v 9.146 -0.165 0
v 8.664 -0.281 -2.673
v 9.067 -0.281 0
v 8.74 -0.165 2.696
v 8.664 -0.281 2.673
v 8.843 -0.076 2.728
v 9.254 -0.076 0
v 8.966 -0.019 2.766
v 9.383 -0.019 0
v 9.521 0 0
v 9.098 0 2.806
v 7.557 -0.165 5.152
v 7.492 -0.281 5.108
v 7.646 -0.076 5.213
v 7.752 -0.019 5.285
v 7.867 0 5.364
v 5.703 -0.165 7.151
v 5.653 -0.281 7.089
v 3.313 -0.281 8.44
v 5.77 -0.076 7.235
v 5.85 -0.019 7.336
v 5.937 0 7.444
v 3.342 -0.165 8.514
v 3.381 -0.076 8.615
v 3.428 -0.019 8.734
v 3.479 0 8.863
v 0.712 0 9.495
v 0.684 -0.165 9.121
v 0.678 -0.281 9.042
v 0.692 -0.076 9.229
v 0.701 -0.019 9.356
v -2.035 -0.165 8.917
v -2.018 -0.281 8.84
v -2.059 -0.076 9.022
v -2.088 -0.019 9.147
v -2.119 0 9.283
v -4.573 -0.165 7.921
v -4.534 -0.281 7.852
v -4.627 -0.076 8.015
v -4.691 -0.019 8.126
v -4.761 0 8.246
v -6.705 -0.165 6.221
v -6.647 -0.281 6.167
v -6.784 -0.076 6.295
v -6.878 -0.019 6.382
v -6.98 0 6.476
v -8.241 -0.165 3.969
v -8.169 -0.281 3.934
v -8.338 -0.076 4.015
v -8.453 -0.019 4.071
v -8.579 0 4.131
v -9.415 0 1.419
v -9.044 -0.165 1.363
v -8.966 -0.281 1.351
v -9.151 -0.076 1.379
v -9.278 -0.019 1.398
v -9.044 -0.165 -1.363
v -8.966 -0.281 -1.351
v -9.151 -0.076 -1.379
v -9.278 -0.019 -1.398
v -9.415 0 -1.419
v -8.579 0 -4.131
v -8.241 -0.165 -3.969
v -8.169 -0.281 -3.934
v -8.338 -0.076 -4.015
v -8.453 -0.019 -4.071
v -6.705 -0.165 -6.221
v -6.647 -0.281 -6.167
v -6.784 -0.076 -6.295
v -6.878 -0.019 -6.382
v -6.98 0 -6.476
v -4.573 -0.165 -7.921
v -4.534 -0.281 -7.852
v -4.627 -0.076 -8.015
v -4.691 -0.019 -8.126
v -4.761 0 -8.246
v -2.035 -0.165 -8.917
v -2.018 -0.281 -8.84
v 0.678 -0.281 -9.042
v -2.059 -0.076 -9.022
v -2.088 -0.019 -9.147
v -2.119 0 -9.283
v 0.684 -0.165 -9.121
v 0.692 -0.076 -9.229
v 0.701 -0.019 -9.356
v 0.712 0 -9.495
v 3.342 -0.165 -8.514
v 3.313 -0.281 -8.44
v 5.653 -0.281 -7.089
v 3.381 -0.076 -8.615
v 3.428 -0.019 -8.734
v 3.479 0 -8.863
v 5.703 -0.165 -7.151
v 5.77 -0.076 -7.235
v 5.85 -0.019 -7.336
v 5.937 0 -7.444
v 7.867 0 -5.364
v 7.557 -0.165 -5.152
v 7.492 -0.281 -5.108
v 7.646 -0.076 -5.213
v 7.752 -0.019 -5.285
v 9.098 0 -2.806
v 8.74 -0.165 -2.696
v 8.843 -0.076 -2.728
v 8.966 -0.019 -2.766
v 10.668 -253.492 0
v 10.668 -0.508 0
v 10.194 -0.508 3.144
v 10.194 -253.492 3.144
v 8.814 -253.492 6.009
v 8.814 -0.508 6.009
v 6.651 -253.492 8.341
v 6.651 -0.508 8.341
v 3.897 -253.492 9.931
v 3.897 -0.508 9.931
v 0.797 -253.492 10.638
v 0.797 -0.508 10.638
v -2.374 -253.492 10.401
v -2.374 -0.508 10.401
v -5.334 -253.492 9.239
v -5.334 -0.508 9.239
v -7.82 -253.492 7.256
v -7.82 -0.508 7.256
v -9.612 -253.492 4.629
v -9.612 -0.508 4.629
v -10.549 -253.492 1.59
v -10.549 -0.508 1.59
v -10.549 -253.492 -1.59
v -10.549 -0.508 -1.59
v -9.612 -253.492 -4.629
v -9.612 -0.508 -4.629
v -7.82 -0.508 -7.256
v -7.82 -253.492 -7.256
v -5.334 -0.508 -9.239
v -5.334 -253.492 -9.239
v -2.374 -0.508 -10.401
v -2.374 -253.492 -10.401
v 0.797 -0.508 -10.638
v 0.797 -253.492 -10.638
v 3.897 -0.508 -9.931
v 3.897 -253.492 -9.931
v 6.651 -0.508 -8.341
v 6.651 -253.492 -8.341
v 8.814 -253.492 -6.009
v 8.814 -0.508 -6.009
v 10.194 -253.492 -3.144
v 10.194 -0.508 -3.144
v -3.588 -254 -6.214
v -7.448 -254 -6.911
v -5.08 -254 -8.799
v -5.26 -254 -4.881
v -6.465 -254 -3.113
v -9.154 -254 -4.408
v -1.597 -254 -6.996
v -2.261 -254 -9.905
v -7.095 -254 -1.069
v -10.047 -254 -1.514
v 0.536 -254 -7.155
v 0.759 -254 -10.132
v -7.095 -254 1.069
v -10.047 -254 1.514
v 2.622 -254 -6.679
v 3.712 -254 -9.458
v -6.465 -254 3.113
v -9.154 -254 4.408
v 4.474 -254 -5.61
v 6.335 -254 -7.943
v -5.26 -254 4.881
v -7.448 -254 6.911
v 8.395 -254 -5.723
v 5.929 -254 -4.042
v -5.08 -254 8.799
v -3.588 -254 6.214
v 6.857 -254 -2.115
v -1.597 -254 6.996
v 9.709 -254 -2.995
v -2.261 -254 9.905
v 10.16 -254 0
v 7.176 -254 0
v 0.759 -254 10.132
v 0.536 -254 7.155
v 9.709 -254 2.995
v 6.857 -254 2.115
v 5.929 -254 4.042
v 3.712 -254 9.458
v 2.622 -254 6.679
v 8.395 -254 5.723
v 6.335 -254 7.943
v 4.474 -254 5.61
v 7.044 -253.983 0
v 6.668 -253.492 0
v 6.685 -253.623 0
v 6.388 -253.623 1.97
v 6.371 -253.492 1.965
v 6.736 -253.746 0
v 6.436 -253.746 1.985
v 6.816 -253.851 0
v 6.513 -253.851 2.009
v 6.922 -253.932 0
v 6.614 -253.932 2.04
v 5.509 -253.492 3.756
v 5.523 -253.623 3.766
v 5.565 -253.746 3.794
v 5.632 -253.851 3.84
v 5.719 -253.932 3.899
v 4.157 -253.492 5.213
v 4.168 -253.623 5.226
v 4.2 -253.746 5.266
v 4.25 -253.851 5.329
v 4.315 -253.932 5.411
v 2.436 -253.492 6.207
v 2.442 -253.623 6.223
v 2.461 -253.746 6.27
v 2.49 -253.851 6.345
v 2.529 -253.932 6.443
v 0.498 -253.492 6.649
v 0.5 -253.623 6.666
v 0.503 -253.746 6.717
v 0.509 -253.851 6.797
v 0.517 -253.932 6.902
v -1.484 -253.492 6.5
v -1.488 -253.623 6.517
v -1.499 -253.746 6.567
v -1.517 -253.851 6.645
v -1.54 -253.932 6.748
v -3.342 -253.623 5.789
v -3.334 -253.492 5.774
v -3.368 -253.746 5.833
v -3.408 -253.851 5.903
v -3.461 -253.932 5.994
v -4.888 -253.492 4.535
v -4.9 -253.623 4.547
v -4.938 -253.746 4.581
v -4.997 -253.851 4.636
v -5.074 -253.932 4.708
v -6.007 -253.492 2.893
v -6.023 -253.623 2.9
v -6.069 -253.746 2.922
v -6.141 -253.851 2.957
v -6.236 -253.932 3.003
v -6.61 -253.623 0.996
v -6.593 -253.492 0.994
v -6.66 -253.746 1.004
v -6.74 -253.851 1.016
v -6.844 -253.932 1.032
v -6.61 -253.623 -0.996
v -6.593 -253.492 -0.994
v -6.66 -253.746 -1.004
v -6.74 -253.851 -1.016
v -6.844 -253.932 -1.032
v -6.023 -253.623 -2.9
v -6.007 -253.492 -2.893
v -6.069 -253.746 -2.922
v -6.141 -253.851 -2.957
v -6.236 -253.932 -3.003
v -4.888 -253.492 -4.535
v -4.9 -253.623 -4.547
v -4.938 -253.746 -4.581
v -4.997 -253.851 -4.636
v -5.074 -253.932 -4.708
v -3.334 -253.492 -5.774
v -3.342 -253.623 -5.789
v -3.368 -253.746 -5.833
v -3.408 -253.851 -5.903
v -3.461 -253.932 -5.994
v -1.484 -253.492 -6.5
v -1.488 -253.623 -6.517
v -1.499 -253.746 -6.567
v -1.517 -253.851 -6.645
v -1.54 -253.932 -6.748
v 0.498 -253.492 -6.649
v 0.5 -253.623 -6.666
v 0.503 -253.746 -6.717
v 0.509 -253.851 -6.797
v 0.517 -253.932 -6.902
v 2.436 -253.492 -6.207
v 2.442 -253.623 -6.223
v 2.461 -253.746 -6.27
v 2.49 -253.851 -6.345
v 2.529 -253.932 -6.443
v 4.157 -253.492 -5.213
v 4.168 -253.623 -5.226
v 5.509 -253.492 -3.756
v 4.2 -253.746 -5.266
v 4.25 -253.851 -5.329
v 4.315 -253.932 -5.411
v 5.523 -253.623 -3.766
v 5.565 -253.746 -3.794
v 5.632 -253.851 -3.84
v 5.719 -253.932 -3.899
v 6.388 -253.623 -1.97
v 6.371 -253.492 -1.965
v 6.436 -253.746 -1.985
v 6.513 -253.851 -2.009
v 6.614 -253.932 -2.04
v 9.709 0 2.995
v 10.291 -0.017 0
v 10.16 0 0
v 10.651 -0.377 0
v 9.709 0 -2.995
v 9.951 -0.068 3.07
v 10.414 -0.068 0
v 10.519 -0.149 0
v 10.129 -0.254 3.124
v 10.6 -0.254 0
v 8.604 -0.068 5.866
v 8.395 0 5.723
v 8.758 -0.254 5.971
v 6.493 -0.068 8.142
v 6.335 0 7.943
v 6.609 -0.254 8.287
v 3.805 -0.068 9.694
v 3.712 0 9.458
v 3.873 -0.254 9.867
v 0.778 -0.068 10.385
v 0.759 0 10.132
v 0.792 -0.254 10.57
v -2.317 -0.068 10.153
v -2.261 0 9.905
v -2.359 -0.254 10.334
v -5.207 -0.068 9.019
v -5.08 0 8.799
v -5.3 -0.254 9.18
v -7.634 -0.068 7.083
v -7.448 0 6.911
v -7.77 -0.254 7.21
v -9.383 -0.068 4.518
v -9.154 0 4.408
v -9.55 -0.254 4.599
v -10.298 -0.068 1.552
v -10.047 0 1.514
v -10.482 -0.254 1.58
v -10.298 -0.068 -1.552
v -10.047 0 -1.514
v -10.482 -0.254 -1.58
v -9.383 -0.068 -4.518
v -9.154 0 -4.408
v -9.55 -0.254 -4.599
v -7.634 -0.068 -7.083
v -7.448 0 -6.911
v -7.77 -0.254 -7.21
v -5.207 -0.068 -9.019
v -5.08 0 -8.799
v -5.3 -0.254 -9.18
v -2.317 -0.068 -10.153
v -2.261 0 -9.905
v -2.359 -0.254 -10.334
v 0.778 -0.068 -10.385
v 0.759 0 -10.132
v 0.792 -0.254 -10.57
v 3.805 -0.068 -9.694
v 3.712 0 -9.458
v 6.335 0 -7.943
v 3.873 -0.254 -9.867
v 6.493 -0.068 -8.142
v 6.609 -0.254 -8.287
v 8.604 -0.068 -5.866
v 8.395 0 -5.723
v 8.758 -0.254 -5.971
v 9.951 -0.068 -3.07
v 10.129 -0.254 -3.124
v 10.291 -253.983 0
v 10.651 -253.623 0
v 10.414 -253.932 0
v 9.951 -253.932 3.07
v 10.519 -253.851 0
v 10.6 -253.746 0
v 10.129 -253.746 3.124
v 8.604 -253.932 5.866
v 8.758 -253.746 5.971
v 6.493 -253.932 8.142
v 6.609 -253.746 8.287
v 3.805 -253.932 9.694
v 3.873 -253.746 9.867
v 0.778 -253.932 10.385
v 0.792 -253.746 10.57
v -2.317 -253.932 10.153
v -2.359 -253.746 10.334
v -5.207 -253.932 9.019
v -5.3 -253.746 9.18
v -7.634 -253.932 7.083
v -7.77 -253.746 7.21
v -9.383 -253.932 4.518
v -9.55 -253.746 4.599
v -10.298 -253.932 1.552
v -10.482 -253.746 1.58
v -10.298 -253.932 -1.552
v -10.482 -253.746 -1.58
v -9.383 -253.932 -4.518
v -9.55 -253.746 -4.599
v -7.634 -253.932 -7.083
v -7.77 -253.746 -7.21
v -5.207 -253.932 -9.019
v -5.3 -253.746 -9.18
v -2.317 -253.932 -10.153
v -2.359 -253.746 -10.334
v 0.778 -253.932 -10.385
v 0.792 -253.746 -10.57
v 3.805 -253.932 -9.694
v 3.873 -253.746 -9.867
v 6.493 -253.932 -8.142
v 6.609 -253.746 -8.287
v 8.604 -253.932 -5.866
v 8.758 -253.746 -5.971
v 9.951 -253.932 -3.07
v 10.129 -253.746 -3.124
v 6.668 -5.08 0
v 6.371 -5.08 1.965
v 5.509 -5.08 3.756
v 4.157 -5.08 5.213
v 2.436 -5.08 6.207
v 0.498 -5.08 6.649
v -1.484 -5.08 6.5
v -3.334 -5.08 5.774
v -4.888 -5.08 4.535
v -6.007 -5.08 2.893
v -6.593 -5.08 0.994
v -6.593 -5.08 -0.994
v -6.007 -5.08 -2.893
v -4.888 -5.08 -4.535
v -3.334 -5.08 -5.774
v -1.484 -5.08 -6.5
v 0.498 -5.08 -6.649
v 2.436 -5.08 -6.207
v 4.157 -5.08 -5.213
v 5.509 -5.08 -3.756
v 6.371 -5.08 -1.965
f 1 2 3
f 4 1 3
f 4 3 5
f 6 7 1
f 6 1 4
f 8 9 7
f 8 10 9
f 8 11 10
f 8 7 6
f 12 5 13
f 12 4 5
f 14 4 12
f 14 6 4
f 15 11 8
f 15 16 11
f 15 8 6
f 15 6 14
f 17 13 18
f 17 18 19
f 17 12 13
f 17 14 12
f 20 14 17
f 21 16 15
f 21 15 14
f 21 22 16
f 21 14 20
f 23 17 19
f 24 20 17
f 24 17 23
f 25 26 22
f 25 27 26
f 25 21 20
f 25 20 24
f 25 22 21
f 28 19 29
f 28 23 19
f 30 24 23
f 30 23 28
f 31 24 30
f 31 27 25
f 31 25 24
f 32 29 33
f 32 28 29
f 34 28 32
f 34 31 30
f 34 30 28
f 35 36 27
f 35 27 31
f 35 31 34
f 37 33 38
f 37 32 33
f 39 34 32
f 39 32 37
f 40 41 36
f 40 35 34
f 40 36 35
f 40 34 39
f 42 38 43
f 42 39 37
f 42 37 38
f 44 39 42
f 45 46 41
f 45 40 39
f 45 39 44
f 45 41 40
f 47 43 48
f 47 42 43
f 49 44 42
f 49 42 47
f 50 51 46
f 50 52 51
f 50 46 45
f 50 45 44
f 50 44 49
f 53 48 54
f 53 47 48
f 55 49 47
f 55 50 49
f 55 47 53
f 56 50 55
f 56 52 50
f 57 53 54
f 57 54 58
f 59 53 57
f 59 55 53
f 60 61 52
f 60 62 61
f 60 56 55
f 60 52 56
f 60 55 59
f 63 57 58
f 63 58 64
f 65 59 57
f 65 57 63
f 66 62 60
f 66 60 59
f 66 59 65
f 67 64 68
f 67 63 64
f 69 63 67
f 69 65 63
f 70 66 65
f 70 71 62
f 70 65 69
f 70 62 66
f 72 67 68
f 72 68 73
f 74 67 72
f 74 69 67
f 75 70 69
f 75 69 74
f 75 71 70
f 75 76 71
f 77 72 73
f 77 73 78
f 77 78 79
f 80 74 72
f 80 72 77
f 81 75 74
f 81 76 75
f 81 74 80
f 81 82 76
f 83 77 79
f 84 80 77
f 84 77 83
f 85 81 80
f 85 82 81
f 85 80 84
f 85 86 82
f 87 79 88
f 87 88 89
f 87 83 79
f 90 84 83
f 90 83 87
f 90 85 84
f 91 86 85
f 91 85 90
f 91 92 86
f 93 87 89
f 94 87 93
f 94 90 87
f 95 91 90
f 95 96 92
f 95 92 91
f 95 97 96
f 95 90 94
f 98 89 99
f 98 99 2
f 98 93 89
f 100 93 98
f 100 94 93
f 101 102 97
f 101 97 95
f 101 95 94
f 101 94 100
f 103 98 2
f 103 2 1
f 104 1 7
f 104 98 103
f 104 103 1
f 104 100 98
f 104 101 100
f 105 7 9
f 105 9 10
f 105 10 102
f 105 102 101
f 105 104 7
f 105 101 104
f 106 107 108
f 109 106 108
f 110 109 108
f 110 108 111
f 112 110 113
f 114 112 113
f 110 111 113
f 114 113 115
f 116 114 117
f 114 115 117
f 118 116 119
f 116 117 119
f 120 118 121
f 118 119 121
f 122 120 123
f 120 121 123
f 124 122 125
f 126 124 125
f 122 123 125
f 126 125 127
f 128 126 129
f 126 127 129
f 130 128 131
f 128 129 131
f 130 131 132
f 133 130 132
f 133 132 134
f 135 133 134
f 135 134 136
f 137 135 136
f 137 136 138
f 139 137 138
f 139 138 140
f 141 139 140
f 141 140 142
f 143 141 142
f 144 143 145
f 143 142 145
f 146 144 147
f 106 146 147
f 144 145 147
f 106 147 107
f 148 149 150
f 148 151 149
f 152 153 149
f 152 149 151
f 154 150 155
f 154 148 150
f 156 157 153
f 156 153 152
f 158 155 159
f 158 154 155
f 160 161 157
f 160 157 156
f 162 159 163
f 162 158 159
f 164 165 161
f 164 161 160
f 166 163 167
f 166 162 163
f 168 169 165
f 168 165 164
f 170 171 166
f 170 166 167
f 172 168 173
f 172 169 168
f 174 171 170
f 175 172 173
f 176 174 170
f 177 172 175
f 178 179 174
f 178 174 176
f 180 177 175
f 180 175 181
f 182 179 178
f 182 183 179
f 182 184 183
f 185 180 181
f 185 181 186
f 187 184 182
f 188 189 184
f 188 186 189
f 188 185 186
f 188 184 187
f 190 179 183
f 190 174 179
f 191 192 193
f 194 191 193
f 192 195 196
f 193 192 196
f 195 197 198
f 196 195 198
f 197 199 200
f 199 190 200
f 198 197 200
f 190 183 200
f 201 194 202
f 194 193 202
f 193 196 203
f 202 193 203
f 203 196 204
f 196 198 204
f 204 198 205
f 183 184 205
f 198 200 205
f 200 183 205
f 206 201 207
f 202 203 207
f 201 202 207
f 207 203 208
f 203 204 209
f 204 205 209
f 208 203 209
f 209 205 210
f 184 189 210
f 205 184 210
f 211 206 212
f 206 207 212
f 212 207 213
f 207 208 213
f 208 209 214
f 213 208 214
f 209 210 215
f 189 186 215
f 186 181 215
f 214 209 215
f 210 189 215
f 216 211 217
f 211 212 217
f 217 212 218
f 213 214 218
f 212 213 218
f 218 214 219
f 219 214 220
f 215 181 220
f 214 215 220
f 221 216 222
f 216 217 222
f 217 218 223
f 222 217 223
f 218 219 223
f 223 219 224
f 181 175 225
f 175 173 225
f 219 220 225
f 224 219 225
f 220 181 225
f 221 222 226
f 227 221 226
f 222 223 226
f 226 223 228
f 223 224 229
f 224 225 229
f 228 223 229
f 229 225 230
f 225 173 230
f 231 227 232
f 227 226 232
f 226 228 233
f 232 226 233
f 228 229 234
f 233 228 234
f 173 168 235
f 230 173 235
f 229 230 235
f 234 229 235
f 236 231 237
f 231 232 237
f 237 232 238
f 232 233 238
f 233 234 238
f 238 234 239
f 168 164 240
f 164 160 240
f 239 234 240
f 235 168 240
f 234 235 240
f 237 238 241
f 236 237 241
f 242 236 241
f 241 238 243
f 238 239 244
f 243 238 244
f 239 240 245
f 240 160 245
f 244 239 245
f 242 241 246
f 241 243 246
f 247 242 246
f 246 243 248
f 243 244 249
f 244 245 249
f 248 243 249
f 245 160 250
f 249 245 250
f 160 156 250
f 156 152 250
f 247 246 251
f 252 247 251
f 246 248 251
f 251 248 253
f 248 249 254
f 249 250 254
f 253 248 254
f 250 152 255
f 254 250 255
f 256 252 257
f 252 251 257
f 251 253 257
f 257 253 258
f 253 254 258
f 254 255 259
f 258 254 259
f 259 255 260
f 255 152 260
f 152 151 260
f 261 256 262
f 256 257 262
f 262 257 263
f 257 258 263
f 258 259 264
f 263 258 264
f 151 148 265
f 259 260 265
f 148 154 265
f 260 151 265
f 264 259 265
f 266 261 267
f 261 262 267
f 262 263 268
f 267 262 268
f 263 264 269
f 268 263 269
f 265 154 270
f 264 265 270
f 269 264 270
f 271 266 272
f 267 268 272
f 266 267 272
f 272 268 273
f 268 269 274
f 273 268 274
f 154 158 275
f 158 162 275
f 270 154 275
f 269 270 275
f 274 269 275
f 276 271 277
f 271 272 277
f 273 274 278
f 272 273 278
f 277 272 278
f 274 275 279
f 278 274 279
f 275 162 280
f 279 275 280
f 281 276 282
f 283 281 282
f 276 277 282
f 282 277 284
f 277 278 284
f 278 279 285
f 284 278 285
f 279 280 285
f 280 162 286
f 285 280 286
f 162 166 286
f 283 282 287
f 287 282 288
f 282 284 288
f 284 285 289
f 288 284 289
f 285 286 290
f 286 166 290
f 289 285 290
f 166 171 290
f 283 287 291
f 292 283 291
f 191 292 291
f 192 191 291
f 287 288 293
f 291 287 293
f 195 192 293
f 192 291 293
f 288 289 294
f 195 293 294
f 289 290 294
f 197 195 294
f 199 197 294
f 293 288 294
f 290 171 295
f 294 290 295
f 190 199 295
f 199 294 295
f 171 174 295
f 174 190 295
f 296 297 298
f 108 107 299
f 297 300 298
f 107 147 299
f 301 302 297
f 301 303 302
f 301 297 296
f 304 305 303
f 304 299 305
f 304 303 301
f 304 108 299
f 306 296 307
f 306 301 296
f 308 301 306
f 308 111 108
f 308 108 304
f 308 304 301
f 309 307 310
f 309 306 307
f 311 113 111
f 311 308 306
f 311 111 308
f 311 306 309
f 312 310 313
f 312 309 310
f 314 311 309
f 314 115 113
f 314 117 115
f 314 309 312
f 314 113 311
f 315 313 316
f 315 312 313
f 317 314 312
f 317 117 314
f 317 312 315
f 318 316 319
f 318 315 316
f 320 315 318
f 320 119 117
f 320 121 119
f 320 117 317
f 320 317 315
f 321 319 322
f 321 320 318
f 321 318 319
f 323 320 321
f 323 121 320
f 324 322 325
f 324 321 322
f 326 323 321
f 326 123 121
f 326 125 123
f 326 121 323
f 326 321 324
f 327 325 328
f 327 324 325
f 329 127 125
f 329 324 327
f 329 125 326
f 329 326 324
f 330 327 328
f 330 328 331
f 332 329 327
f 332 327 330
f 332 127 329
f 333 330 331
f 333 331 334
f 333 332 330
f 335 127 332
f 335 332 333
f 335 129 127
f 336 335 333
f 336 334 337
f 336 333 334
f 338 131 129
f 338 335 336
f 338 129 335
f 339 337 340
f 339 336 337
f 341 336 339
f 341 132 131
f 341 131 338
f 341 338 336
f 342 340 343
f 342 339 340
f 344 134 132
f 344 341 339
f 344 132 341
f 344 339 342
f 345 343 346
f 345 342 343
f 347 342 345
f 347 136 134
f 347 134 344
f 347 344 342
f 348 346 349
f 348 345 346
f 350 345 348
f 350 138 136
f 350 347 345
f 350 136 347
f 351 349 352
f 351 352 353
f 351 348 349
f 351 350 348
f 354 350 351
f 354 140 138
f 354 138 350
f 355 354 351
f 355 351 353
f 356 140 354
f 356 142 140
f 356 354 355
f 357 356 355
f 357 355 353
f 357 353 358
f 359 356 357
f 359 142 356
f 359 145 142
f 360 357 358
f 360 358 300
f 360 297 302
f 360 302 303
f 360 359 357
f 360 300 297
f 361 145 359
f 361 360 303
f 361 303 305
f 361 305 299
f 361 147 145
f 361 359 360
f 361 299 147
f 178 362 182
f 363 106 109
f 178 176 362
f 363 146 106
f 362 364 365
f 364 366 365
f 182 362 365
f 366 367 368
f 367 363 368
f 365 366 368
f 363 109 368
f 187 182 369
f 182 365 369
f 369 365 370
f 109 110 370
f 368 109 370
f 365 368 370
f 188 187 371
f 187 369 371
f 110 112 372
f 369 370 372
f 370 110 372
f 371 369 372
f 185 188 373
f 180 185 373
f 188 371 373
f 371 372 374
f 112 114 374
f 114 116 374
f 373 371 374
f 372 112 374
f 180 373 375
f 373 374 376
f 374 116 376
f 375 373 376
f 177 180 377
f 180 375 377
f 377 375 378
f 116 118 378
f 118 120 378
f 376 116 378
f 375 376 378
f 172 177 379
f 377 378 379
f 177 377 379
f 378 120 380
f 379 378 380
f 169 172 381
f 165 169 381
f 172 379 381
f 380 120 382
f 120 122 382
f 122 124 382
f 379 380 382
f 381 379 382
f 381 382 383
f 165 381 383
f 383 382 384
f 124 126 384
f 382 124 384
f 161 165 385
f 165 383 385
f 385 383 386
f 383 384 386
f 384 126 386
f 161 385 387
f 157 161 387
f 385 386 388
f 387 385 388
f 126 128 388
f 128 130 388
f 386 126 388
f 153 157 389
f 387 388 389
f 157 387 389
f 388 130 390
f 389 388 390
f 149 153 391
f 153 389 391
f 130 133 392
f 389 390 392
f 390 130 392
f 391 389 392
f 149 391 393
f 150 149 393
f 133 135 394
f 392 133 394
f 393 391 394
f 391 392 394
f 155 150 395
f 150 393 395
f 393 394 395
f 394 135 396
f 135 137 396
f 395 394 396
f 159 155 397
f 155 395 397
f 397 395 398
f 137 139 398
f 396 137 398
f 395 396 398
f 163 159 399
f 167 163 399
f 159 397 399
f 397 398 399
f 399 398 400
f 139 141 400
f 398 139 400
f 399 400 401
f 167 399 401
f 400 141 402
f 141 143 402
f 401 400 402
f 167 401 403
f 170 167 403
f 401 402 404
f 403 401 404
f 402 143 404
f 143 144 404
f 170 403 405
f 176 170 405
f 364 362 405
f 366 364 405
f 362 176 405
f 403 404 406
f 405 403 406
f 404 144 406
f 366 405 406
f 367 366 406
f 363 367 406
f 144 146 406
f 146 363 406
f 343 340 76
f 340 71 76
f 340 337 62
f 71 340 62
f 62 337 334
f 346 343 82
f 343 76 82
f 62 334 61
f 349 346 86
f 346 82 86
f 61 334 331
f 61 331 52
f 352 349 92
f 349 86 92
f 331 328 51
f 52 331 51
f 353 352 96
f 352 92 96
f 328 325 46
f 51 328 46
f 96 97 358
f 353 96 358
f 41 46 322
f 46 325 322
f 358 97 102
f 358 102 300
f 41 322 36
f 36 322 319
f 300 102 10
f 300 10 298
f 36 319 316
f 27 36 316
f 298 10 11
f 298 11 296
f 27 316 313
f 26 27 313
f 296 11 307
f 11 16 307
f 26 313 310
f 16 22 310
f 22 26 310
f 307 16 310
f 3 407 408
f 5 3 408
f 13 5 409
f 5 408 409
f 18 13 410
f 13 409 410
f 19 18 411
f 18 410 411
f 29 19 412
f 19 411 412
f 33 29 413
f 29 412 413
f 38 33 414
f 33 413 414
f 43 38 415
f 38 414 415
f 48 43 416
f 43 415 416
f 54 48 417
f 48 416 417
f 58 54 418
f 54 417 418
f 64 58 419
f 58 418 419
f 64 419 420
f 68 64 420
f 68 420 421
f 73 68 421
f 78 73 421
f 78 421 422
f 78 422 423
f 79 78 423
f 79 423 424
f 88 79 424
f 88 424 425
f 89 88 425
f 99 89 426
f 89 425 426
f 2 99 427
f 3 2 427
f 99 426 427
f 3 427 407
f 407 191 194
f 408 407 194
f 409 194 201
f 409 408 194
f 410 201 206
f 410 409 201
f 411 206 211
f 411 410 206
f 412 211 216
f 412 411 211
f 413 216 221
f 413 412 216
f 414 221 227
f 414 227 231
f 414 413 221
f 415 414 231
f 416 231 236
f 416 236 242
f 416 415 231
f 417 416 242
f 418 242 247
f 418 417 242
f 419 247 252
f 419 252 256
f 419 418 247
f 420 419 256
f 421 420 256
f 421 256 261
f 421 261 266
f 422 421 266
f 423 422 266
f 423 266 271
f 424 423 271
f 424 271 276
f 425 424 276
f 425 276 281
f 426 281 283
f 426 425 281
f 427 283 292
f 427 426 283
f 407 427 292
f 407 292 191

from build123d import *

# Parameters (mm, degrees)
F0_R     = 10.668
F0_R_2   = 6.6675
F1_DEPTH = 254
F2_SIZE2 = 5.08
F2_SIZE  = 2.54
F3_R     = 0.508
F4_R     = 0.508


with BuildPart() as f1:
    # F0 (on Front) → F1 (new body)
    with BuildSketch(Plane.XZ):
        Circle(F0_R)
        Circle(F0_R_2, mode=Mode.SUBTRACT)
    extrude(amount=F1_DEPTH)

    # F2
    f2_edges = [f1.edges().sort_by_distance(p)[0] for p in [
        (-6.6675, 0, 0),
    ]]
    f2_side = f1.faces().sort_by_distance((-10.366263, 0, 0))[0]
    chamfer(f2_edges, length=F2_SIZE, length2=F2_SIZE2, reference=f2_side)

    # F3
    f3_edges = [f1.edges().sort_by_distance(p)[0] for p in [
        (-10.668, 0, 0),
        (-9.2075, 0, 0),
    ]]
    fillet(f3_edges, radius=F3_R)

    # F4
    f4_edges = [f1.edges().sort_by_distance(p)[0] for p in [
        (-10.668, -254, 0),
        (-6.6675, -254, 0),
    ]]
    fillet(f4_edges, radius=F4_R)


solid = f1.part
